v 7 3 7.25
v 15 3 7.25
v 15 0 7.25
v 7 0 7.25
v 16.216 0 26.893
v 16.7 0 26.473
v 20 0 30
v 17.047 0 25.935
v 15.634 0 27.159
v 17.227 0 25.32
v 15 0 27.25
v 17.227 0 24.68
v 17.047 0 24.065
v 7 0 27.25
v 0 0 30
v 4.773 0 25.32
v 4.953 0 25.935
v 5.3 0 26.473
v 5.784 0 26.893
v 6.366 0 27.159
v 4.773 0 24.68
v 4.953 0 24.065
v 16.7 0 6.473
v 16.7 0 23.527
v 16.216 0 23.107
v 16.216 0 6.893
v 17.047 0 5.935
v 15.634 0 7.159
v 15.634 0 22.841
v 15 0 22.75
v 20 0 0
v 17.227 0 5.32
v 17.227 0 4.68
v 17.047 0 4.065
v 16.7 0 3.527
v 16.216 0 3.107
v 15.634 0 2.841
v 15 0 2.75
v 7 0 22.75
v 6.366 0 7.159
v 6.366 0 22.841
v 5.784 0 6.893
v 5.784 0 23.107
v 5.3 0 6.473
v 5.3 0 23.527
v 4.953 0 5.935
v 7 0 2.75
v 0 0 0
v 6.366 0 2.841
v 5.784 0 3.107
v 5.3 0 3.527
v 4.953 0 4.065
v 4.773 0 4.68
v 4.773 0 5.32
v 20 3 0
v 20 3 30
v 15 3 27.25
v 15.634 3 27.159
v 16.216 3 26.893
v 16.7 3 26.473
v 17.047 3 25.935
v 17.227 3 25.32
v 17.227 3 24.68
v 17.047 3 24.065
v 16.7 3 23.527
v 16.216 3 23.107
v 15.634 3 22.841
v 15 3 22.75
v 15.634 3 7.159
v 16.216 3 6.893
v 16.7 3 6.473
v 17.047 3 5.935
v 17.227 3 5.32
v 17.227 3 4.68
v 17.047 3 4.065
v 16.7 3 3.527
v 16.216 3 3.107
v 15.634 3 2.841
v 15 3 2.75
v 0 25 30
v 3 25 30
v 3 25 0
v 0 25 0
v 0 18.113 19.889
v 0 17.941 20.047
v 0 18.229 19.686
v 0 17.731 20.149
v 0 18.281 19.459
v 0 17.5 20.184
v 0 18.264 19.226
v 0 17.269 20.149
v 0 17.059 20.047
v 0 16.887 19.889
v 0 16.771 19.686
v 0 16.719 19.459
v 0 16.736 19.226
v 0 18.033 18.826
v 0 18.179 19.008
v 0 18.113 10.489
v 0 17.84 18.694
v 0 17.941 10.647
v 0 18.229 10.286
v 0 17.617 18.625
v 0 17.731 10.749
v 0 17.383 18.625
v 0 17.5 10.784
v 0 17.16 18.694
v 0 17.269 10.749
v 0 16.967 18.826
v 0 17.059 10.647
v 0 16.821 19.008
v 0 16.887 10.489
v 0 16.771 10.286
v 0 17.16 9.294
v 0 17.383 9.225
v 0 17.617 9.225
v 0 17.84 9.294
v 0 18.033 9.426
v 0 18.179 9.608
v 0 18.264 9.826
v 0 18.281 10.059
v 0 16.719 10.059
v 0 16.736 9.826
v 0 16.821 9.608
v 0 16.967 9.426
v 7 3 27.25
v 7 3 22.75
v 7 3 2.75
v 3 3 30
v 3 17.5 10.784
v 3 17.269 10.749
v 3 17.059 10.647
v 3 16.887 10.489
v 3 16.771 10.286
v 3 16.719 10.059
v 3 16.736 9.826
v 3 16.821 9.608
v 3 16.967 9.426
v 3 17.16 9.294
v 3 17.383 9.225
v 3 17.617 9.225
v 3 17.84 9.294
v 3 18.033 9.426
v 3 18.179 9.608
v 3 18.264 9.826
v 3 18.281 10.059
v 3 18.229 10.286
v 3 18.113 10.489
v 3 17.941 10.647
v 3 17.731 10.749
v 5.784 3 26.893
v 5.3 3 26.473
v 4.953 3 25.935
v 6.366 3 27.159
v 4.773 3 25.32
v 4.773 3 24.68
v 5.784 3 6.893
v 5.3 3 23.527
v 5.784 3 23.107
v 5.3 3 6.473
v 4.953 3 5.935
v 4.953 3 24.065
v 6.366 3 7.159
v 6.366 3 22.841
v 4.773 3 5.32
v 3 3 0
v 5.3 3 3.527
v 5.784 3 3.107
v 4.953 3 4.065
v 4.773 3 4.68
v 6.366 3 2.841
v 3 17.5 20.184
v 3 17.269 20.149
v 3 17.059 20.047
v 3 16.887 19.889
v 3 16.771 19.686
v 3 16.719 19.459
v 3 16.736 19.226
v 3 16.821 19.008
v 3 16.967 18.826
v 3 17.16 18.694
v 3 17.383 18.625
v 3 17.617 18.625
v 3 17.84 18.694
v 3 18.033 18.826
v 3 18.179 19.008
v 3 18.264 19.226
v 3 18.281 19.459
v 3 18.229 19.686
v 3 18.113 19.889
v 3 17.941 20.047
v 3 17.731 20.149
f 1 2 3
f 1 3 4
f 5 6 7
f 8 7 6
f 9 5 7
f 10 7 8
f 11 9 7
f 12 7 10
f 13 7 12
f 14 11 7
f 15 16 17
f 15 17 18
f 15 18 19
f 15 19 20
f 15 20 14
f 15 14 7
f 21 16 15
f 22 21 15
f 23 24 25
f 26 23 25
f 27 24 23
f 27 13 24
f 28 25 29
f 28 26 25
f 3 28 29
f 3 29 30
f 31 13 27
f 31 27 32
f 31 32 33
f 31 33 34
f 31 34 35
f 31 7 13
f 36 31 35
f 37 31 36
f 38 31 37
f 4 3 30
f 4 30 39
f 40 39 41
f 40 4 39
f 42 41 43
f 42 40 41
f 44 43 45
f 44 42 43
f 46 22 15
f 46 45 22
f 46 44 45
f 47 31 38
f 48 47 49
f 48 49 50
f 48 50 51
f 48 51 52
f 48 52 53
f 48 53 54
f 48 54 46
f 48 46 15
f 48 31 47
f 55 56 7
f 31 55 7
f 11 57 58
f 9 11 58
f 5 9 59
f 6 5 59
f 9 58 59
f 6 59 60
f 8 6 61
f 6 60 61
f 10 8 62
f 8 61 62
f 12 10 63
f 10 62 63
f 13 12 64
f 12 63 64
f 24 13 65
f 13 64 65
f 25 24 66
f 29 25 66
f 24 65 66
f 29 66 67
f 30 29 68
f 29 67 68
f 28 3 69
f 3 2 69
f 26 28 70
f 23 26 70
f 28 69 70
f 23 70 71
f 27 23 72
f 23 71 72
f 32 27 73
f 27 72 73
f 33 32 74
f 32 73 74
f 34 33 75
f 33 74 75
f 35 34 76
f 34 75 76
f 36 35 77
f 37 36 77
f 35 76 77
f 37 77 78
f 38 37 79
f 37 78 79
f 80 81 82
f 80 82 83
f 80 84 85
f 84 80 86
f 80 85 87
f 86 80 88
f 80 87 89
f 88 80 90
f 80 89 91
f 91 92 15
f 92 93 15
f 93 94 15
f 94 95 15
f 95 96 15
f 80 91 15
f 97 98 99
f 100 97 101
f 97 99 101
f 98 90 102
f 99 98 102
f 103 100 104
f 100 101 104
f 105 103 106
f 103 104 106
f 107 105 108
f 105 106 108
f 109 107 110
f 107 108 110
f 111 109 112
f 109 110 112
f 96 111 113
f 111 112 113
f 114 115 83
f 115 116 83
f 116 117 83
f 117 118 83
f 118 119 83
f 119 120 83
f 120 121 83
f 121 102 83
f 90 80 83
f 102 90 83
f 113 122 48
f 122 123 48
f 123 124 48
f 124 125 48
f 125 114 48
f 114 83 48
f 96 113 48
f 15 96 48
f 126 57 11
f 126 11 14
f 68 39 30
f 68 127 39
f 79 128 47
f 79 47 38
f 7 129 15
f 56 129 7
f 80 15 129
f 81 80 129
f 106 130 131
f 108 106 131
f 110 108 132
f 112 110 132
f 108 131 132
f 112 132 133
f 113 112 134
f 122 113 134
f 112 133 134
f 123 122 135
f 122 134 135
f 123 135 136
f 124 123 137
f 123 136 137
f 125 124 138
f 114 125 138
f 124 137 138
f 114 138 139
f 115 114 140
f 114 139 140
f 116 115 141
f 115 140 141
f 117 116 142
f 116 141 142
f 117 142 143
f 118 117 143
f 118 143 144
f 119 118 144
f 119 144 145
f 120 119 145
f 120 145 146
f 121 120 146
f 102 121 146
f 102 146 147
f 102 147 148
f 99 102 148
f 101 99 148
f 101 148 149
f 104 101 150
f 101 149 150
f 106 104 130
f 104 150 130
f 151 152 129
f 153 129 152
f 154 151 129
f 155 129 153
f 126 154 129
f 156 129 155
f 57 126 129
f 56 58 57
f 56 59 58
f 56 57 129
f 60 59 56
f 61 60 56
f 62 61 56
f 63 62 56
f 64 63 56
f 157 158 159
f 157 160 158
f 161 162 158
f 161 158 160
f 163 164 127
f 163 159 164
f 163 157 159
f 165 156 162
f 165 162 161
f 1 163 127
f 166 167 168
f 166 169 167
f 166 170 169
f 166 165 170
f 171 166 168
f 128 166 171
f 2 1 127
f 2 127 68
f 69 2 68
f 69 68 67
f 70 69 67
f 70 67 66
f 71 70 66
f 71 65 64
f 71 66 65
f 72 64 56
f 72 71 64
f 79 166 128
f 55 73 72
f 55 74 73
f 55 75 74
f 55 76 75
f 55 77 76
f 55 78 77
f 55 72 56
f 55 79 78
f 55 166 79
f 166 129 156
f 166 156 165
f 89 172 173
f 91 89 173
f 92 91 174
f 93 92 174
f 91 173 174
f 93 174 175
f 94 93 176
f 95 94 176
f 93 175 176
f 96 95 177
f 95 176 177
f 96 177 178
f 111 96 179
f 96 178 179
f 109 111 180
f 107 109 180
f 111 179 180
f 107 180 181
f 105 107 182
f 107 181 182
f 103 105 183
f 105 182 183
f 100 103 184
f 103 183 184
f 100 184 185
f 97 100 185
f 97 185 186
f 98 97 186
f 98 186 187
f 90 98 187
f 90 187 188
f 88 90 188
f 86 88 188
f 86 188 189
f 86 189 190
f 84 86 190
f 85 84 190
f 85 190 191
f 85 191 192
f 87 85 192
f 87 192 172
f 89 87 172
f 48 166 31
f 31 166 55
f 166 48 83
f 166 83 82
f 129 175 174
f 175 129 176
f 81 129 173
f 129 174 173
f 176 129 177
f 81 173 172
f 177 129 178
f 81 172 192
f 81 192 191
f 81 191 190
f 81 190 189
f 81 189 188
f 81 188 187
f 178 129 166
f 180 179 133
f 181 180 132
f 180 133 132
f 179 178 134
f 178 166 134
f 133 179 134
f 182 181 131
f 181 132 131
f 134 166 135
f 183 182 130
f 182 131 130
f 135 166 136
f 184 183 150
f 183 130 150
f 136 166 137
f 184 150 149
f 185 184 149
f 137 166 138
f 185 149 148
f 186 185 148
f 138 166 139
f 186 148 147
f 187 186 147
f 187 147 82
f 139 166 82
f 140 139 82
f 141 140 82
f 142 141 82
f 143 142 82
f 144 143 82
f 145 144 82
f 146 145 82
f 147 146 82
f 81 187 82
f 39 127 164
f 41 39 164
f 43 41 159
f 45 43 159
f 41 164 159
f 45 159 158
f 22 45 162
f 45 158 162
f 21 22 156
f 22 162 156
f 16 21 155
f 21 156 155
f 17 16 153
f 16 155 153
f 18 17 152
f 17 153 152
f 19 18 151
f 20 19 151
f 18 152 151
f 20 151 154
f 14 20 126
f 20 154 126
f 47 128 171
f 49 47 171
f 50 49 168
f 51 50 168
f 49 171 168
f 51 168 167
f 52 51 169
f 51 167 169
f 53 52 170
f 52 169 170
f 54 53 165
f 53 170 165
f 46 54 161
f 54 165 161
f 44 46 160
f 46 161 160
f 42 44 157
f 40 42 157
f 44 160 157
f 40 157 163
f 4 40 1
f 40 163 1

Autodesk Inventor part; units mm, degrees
ref_plane "YZ Plane" through (0, 0, 0) normal (1, 0, 0) x (0, 1, 0)
ref_plane "XZ Plane" through (0, 0, 0) normal (0, 1, 0) x (-1, 0, 0)
ref_plane "XY Plane" through (0, 0, 0) normal (0, 0, 1) x (1, 0, 0)
sketch "Skizze1" plane through (0, 0, 0) normal (0, 0, 1) x (1, 0, 0)
  line L0 (3, 3) -> (3, 25)
  line L1 (3, 25) -> (0, 25)
  line L2 (0, 25) -> (0, 0)
  line L3 (3, 3) -> (20, 3)
  line L4 (20, 3) -> (20, 0)
  line L5 (20, 0) -> (0, 0)
  dimension "d0" = 25
  dimension "d1" = 20
  dimension "d2" = 3
extrude "Extrusion1" add sketch "Skizze1" along normal blind 30
sketch "Skizze2" plane through (0, 0, 0) normal (0, -1, 0) x (1, 0, 0)
  line L0 (20, 30) -> (0, 30) projected
  line L1 (0, 0) -> (0, 30) projected
  line L2 (20, 0) -> (0, 0) projected
  line L3 (20, 0) -> (20, 30) projected
  line L4 (10, 30) -> (10, 0)
  line L5 (0, 15) -> (20, 15)
  point P0 (10, 25)
  point P1 (10, 5)
  dimension "d5" = 20
  dimension "d6" = 10
hole "Bohrung1" at (10, 0, 25) at (10, 0, 5) direction (0, 1, 0) diameter 4.5 end through all
sketch "Skizze3" plane through (3, 3, 0) normal (0, 1, 0) x (1, 0, 0)
  circle A0 centre (7, -25) radius 2.25 projected
  line L0 (17, 0) -> (17, -30) projected
  line L1 (4, -22.75) -> (12, -22.75)
  line L2 (12, -27.25) -> (4, -27.25)
  arc A1 (4, -22.75) -> (4, -27.25) centre (4, -25) ccw
  arc A2 (12, -27.25) -> (12, -22.75) centre (12, -25) ccw
  point P0 (-3, 0)
  dimension "d14" = 5
  dimension "d15" = 8
extrude "Extrusion2" cut sketch "Skizze3" against normal through all contours A0 L1 A2 L2 | A0 L2 A1 L1
pattern_linear "Rechteckige Anordnung1" count 2 spacing 20 along (0, 0, -1) of "Extrusion2"
sketch "Skizze4" plane through (0, 0, 0) normal (-1, 0, 0) x (0, 0, 1)
  circle A0 centre (10, 17.5) radius 1.1 projected
  circle A1 centre (19.4, 17.5) radius 1.1 projected
hole "Bohrung2" at (0, 17.5, 10) at (0, 17.5, 19.4) direction (1, 0, 0) diameter 1.567 end through all thread size "M2x0.4" class "6H" standard "ISO Metric profile"
properties part number "13_0204_067"
